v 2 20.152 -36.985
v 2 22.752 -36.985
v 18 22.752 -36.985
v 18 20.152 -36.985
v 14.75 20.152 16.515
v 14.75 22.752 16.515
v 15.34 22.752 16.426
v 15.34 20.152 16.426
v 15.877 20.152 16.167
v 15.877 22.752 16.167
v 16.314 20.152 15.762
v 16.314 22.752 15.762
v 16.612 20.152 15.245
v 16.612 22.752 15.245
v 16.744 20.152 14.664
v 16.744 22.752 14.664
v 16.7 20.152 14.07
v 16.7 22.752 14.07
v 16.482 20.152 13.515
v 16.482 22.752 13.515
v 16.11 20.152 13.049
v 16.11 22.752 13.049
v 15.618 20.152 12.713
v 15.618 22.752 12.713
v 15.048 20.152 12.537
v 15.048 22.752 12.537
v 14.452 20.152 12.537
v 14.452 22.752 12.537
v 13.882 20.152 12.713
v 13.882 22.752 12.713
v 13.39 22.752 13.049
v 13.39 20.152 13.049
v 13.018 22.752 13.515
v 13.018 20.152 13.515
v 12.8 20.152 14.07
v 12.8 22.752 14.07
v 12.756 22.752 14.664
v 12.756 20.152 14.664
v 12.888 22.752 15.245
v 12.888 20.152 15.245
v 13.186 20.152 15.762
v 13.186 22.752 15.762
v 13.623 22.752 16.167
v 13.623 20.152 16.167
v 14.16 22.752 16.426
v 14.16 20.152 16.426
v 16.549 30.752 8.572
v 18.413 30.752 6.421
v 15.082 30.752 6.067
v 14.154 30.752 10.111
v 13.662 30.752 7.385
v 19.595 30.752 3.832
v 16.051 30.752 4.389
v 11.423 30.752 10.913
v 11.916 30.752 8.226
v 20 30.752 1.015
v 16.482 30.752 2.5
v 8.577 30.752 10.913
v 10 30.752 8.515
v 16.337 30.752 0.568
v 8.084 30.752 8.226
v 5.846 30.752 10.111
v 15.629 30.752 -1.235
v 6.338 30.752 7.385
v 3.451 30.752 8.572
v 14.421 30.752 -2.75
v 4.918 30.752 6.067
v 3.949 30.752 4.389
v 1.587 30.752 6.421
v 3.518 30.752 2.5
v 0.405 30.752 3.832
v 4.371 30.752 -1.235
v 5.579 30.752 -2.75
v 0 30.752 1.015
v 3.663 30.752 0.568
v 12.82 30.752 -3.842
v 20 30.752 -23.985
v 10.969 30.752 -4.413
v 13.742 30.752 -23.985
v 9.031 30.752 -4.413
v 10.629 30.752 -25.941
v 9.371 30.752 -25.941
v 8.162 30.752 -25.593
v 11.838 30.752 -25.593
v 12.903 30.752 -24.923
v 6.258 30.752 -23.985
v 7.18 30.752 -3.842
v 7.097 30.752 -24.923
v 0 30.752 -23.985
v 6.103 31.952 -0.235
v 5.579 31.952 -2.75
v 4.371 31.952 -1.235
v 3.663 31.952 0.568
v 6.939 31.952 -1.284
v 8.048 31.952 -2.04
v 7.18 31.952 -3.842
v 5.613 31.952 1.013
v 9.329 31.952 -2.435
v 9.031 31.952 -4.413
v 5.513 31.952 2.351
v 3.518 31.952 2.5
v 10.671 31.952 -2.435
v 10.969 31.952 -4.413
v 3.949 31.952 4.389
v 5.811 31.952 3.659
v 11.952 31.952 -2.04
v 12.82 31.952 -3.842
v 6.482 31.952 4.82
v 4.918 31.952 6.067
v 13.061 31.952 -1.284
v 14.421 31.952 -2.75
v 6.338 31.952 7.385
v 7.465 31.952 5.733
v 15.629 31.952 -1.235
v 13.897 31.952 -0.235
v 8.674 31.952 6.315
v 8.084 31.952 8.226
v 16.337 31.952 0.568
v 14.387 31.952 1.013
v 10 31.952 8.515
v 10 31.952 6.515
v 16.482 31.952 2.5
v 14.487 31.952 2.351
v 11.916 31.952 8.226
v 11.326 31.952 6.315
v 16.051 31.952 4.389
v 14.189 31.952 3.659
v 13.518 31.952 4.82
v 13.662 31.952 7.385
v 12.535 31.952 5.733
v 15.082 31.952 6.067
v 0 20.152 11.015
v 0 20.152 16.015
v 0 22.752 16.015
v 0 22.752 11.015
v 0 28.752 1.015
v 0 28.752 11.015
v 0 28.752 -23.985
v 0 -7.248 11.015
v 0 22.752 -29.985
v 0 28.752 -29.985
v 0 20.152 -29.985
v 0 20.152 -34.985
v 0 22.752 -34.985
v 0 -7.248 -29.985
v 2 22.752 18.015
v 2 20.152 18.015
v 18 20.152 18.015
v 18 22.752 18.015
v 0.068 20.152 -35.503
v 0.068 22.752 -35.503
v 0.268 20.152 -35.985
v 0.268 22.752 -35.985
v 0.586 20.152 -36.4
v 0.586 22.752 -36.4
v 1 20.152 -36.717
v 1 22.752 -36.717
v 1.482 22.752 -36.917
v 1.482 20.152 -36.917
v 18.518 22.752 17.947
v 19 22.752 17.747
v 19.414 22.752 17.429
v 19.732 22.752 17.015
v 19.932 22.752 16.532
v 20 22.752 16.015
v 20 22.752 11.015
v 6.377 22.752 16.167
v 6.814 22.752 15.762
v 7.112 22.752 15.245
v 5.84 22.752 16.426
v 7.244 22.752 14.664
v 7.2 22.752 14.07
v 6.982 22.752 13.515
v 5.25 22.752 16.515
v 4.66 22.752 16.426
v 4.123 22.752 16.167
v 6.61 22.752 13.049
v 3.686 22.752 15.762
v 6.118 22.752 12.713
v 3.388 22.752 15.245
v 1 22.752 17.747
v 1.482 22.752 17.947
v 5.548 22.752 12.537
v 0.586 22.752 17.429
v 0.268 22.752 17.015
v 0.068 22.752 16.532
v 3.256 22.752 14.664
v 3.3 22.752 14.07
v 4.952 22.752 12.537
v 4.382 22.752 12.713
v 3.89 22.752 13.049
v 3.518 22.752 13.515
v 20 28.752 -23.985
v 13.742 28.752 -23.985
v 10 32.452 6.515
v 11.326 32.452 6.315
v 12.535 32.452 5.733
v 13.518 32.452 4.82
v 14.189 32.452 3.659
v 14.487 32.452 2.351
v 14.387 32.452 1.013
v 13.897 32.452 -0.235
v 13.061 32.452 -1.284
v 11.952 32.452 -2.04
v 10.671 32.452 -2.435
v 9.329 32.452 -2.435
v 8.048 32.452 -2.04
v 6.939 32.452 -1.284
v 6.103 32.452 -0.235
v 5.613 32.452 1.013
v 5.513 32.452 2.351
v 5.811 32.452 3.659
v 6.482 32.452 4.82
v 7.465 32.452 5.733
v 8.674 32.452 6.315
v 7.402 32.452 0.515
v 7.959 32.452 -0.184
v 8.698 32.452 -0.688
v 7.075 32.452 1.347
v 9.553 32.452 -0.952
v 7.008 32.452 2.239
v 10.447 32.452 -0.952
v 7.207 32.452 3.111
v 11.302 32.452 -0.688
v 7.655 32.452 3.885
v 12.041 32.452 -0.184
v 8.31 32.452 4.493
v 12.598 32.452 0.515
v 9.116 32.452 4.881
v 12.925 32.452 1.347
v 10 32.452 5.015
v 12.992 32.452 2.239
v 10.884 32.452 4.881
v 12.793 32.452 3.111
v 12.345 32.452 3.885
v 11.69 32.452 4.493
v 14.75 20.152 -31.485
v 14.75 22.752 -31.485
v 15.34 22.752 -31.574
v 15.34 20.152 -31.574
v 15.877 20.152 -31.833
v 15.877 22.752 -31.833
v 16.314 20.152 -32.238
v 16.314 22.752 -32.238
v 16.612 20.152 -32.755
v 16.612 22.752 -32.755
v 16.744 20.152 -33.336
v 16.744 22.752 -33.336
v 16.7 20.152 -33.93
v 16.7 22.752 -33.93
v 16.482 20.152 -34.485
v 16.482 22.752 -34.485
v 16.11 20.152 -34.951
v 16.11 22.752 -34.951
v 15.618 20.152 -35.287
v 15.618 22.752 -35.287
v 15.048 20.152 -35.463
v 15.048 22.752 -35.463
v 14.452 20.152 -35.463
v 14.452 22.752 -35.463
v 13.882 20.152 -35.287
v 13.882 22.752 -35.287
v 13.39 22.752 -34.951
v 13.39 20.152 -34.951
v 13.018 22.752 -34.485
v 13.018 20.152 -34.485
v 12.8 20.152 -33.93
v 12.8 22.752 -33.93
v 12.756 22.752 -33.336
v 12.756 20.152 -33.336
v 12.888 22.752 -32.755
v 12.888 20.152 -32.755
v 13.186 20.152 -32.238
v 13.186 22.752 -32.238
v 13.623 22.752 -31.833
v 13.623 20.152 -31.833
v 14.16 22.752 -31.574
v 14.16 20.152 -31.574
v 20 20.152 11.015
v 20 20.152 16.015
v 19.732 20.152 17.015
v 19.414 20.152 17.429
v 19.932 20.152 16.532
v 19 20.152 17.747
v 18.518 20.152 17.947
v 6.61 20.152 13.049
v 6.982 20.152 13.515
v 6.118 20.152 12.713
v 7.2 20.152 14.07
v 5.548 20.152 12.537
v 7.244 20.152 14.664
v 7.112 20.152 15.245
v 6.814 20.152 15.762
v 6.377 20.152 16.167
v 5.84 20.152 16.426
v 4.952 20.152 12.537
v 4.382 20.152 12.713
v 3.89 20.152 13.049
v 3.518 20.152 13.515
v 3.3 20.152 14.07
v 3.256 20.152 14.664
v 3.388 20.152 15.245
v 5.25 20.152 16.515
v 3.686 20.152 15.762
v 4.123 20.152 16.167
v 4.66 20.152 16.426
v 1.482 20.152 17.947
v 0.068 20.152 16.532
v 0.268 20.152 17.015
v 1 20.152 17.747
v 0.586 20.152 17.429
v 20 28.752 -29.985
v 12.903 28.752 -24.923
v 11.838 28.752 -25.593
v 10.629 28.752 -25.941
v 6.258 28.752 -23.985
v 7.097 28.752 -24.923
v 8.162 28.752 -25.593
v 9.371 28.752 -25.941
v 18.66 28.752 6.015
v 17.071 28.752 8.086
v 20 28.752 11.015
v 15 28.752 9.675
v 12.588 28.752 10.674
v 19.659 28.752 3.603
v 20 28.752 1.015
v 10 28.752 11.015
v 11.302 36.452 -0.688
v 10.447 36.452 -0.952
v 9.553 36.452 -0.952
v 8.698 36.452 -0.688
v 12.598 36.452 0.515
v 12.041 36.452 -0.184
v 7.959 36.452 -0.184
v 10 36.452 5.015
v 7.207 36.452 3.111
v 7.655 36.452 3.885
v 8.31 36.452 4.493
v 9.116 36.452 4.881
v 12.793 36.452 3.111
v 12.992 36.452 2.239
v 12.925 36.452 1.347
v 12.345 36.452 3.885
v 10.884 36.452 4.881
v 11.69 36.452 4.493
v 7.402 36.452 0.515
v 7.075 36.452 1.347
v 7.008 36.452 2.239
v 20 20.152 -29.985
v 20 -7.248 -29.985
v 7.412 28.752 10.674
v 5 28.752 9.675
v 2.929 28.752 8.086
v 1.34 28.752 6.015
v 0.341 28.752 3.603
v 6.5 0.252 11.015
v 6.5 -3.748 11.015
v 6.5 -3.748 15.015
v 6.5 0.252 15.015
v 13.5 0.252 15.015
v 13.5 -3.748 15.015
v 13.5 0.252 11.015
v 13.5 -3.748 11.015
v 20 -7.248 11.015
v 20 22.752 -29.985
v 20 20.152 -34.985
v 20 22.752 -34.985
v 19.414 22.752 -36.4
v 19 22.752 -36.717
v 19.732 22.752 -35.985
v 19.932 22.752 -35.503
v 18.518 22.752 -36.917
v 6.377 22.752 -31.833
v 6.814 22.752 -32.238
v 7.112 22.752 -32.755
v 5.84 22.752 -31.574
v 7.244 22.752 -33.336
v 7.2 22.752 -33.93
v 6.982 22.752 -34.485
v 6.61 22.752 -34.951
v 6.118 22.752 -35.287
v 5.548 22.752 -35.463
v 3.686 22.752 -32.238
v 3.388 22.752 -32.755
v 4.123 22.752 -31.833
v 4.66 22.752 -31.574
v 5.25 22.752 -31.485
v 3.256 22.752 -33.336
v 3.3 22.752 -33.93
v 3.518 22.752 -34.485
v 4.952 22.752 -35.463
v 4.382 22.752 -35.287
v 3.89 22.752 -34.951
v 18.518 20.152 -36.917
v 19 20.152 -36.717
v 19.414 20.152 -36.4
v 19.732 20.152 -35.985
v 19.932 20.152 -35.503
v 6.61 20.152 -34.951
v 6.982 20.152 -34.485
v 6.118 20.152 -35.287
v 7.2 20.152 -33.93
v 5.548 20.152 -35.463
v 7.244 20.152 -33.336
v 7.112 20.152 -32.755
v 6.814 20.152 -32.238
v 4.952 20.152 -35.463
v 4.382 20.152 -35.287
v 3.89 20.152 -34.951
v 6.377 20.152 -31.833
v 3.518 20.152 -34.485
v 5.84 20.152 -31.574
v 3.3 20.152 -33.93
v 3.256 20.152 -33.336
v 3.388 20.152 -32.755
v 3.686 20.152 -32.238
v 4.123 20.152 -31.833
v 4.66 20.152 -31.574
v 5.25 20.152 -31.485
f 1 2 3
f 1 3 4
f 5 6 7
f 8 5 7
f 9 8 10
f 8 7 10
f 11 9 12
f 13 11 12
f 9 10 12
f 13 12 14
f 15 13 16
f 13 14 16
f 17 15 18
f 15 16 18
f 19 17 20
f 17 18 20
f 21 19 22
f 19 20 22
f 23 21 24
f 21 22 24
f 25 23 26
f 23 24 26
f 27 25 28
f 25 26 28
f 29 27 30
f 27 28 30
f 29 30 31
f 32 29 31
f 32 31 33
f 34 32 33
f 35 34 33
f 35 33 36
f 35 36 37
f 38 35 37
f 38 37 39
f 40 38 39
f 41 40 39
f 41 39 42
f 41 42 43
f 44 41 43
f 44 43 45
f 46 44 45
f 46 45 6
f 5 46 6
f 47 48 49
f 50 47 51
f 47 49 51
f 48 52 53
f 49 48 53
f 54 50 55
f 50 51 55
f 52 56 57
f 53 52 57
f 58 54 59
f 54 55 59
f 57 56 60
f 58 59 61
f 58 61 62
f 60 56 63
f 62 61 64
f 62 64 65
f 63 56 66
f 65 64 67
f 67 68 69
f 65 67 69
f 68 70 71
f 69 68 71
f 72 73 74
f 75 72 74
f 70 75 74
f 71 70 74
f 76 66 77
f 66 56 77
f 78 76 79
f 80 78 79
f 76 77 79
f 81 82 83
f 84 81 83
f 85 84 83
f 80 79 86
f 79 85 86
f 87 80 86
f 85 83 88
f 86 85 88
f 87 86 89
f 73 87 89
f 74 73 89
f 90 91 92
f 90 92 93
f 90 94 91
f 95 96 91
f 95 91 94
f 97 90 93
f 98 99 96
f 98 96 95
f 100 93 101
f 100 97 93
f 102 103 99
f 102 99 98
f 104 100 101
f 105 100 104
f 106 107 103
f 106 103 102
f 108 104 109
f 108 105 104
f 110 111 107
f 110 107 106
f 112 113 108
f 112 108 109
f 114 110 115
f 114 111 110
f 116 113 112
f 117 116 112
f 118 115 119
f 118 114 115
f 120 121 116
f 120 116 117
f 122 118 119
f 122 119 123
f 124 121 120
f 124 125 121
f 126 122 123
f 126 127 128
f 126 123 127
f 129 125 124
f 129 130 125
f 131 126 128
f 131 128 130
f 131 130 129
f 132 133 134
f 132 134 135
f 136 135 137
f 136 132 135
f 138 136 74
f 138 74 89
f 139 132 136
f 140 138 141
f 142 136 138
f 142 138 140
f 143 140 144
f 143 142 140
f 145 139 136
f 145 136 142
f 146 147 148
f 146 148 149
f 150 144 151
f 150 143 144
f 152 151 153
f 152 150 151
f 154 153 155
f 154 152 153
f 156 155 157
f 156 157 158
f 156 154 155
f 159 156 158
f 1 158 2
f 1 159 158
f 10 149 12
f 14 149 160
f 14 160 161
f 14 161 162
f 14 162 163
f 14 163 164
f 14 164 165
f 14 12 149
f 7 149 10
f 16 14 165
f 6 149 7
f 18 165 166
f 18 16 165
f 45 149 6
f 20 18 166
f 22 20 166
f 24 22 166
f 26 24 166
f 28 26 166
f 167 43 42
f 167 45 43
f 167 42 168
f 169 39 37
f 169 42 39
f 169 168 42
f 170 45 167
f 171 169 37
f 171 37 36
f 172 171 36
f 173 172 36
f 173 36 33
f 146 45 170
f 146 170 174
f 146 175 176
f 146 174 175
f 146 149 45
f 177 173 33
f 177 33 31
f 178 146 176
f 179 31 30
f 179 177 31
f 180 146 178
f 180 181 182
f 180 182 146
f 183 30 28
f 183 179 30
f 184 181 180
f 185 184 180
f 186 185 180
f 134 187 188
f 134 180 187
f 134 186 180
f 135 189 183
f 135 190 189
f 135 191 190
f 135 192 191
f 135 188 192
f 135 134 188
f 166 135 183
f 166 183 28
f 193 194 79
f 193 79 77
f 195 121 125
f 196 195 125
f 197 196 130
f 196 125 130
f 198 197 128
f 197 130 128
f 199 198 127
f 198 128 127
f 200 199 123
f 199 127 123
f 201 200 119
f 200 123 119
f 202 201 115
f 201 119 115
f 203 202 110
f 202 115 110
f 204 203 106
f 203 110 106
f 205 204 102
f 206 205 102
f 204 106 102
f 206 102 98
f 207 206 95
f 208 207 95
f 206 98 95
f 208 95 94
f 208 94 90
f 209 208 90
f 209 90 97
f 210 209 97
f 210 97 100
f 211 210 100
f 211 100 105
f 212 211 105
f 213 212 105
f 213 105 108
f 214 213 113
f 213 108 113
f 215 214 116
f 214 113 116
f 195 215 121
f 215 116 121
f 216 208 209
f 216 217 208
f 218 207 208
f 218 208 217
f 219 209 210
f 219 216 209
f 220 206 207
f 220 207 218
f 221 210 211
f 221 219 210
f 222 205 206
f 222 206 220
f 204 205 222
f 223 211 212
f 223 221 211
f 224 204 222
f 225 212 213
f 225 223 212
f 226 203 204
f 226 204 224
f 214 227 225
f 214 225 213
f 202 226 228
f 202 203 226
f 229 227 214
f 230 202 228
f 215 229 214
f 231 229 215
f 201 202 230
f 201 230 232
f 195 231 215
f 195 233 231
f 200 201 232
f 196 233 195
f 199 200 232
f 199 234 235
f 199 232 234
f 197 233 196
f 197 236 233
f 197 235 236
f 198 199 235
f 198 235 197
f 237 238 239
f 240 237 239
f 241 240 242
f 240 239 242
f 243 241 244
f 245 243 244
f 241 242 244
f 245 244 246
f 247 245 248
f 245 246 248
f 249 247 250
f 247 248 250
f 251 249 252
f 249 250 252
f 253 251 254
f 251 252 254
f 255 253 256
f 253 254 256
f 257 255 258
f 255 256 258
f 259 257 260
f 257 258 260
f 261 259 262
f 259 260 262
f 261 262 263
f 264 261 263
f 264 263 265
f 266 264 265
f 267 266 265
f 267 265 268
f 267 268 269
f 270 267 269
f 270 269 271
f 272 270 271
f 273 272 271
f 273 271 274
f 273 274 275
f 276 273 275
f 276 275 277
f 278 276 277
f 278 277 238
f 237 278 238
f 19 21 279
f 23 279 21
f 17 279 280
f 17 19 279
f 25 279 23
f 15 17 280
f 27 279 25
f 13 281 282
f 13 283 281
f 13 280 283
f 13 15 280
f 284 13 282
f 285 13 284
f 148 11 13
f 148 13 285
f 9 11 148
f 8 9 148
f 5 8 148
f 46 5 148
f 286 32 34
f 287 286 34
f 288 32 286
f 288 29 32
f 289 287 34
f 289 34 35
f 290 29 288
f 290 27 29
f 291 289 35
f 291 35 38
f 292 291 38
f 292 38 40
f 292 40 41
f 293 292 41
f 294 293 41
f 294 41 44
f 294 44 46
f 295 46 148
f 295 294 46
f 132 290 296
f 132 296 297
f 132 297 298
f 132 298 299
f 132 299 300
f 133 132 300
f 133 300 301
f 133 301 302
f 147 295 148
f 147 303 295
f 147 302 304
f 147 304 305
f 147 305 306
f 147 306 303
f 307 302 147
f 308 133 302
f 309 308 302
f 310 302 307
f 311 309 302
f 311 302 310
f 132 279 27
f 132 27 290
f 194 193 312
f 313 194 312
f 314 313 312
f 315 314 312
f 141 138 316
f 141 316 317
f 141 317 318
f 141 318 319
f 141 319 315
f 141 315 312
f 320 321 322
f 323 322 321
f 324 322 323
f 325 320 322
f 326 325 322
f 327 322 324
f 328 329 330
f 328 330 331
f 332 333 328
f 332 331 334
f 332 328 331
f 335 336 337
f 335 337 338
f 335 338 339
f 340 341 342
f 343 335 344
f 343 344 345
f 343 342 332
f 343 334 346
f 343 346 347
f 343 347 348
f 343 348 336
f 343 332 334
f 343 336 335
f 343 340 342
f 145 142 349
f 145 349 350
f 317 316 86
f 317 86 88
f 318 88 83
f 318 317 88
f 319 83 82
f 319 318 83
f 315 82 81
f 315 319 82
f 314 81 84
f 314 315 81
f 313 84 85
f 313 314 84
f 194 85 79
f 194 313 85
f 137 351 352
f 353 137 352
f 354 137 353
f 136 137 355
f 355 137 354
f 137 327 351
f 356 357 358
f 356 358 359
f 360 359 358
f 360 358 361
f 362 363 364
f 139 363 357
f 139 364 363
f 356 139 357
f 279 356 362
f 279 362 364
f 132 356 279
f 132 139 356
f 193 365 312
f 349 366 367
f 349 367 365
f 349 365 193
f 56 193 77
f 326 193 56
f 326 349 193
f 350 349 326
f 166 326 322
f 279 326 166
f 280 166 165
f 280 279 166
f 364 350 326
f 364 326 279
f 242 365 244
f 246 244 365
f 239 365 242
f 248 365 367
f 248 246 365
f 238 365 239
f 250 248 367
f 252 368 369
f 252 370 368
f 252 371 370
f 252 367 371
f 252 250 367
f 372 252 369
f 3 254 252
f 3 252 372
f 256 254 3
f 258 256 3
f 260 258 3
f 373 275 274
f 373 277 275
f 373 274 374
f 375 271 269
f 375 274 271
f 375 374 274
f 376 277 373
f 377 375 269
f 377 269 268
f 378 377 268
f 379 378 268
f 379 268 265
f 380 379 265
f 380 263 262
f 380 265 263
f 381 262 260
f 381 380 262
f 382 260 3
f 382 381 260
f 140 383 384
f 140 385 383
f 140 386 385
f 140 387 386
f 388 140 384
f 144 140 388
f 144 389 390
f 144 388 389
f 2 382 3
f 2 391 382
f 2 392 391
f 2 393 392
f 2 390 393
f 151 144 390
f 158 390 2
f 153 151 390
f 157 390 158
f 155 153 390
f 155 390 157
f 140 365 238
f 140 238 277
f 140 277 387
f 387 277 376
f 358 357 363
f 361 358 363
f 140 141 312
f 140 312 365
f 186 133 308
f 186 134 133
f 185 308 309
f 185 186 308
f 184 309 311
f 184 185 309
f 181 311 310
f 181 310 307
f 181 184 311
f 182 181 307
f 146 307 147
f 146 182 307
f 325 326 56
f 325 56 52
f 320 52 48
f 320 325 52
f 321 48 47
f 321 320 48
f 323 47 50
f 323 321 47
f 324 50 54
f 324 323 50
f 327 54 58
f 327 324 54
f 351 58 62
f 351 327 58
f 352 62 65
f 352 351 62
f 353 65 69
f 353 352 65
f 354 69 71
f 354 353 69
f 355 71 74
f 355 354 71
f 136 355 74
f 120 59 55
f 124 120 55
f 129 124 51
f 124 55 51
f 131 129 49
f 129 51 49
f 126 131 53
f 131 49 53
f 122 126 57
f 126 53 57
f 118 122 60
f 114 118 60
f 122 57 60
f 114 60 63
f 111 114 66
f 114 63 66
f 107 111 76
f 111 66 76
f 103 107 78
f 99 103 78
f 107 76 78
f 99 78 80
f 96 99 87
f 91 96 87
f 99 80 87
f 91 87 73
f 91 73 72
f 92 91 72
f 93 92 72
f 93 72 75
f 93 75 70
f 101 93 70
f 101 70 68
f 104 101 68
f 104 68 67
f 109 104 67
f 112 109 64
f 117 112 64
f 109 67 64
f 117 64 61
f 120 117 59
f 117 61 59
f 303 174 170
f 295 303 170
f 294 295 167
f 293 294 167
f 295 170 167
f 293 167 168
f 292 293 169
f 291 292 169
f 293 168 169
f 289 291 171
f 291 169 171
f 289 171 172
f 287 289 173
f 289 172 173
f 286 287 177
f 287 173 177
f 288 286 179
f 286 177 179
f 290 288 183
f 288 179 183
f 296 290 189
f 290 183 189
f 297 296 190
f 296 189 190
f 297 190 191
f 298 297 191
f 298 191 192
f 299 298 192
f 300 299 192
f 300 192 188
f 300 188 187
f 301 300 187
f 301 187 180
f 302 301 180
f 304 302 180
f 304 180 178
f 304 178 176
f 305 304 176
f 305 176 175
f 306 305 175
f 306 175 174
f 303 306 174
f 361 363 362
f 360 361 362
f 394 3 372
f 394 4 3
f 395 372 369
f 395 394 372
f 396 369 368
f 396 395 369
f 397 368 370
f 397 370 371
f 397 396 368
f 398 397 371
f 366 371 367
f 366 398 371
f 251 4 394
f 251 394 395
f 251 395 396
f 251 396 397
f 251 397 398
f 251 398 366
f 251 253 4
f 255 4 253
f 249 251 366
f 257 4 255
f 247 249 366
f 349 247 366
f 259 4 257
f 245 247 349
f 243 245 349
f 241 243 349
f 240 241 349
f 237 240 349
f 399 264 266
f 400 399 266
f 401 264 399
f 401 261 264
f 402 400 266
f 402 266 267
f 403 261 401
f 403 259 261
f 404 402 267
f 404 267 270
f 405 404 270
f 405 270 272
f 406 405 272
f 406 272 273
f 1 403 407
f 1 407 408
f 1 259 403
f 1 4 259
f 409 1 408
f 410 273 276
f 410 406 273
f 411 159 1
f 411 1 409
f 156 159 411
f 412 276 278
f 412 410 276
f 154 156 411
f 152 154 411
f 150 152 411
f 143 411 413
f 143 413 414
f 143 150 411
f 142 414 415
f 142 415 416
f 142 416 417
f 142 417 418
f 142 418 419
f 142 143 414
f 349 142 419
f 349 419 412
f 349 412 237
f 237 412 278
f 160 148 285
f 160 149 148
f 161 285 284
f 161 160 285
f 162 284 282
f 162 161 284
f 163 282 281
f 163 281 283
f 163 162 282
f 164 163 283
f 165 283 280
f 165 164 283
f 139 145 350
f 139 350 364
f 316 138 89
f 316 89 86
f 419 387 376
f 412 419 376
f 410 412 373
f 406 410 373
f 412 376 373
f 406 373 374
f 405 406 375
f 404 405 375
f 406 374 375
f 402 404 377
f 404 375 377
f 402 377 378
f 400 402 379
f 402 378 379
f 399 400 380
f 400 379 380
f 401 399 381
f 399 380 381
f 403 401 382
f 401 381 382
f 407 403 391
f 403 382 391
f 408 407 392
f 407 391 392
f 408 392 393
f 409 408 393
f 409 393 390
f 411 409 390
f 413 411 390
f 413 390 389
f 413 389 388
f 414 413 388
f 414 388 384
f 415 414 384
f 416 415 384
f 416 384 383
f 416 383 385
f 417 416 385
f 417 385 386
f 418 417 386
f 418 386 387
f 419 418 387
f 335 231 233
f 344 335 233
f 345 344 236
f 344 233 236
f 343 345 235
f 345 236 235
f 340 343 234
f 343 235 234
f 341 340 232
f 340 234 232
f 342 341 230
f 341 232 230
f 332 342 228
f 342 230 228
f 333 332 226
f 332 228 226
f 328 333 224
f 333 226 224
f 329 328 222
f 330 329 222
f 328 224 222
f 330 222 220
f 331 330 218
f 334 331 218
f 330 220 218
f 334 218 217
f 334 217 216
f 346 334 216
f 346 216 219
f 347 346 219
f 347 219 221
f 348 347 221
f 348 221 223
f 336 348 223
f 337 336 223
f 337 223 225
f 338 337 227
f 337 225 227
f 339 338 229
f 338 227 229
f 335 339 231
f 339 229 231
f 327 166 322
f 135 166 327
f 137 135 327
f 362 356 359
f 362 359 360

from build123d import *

# Parameters (mm, degrees)
AUFSATZ_LINEAR_AUSTRAGEN3_DEPTH = 20
AUFSATZ_LINEAR_AUSTRAGEN4_DEPTH = 2
SKIZZE3_R                       = 6.5
AUFSATZ_LINEAR_AUSTRAGEN5_DEPTH = 1.2
SCHNITT_LINEAR_AUSTRAGEN1_REACH = 53.652
SKIZZE4_R                       = 2
SKIZZE6_W                       = 7
SKIZZE6_H                       = 4
AUFSATZ_LINEAR_AUSTRAGEN6_DEPTH = 4
SKIZZE7_R                       = 4.5
AUFSATZ_LINEAR_AUSTRAGEN7_DEPTH = 0.5
SKIZZE8_R                       = 3
AUFSATZ_LINEAR_AUSTRAGEN8_DEPTH = 4
VERRUNDUNG3_R                   = 2


with BuildPart() as part:
    # Skizze1 → Aufsatz-Linear austragen3 (new body)
    with BuildSketch(Plane(origin=(0, 0, 0), x_dir=(0, 0, -1), z_dir=(1, 0, 0))):
        Polygon((-11.014679398, 22.752092755), (-11.014679398, 28.752092755), (29.985320602, 28.752092755), (29.985320602, 22.752092755), (36.985320602, 22.752092755), (36.985320602, 20.152092755), (29.985320602, 20.152092755), (29.985320602, -7.247907245), (-11.014679398, -7.247907245), (-11.014679398, 20.152092755), (-18.014679398, 20.152092755), (-18.014679398, 22.752092755), align=None)
    extrude(amount=AUFSATZ_LINEAR_AUSTRAGEN3_DEPTH)

    # Skizze2 → Aufsatz-Linear austragen4 (add)
    with BuildSketch(Plane(origin=(0, 28.752092755, 0), x_dir=(1, 0, 0), z_dir=(0, 1, 0))):
        with BuildLine():
            Line((0, -1.014679398), (0, 23.985320602))
            Line((0, 23.985320602), (6.258342613, 23.985320602))
            ThreePointArc((6.258342613, 23.985320602), (10, 25.985320602), (13.741657387, 23.985320602))
            Line((13.741657387, 23.985320602), (20, 23.985320602))
            Line((20, 23.985320602), (20, -1.014679398))
            ThreePointArc((20, -1.014679398), (10, -11.014679398), (0, -1.014679398))
        make_face()
    extrude(amount=AUFSATZ_LINEAR_AUSTRAGEN4_DEPTH)

    # Skizze3 → Aufsatz-Linear austragen5 (add)
    with BuildSketch(Plane(origin=(0, 30.752092755, 0), x_dir=(1, 0, 0), z_dir=(0, 1, 0))):
        with Locations(Location((10, -2.014679398, 0), (0, 0, 270))):
            Circle(SKIZZE3_R)
    extrude(amount=AUFSATZ_LINEAR_AUSTRAGEN5_DEPTH)

    # Skizze4 → Schnitt-Linear austragen1 (cut, up to next)
    with BuildSketch(Plane(origin=(0, 22.752092755, 0), x_dir=(1, 0, 0), z_dir=(0, 1, 0)), mode=Mode.PRIVATE) as schnitt_linear_austragen1_sk1:
        with Locations(Location((5.25, -14.514679398, 0), (0, 0, 270))):
            Circle(SKIZZE4_R)
    schnitt_linear_austragen1_tool1 = extrude(schnitt_linear_austragen1_sk1.sketch, amount=-SCHNITT_LINEAR_AUSTRAGEN1_REACH, mode=Mode.PRIVATE) & part.part
    # Skizze4 → Schnitt-Linear austragen1 (cut, up to next)
    with BuildSketch(Plane(origin=(0, 22.752092755, 0), x_dir=(1, 0, 0), z_dir=(0, 1, 0)), mode=Mode.PRIVATE) as schnitt_linear_austragen1_sk2:
        with Locations(Location((14.75, -14.514679398, 0), (0, 0, 270))):
            Circle(SKIZZE4_R)
    schnitt_linear_austragen1_tool2 = extrude(schnitt_linear_austragen1_sk2.sketch, amount=-SCHNITT_LINEAR_AUSTRAGEN1_REACH, mode=Mode.PRIVATE) & part.part
    # Skizze4 → Schnitt-Linear austragen1 (cut, up to next)
    with BuildSketch(Plane(origin=(0, 22.752092755, 0), x_dir=(1, 0, 0), z_dir=(0, 1, 0)), mode=Mode.PRIVATE) as schnitt_linear_austragen1_sk3:
        with Locations(Location((14.75, 33.485320602, 0), (0, 0, 270))):
            Circle(SKIZZE4_R)
    schnitt_linear_austragen1_tool3 = extrude(schnitt_linear_austragen1_sk3.sketch, amount=-SCHNITT_LINEAR_AUSTRAGEN1_REACH, mode=Mode.PRIVATE) & part.part
    # Skizze4 → Schnitt-Linear austragen1 (cut, up to next)
    with BuildSketch(Plane(origin=(0, 22.752092755, 0), x_dir=(1, 0, 0), z_dir=(0, 1, 0)), mode=Mode.PRIVATE) as schnitt_linear_austragen1_sk4:
        with Locations(Location((5.25, 33.485320602, 0), (0, 0, 270))):
            Circle(SKIZZE4_R)
    schnitt_linear_austragen1_tool4 = extrude(schnitt_linear_austragen1_sk4.sketch, amount=-SCHNITT_LINEAR_AUSTRAGEN1_REACH, mode=Mode.PRIVATE) & part.part
    add(schnitt_linear_austragen1_tool1.solids().sort_by_distance((5.25, 22.752093, 14.514679))[0], mode=Mode.SUBTRACT)
    add(schnitt_linear_austragen1_tool2.solids().sort_by_distance((14.75, 22.752093, 14.514679))[0], mode=Mode.SUBTRACT)
    add(schnitt_linear_austragen1_tool3.solids().sort_by_distance((14.75, 22.752093, -33.485321))[0], mode=Mode.SUBTRACT)
    add(schnitt_linear_austragen1_tool4.solids().sort_by_distance((5.25, 22.752093, -33.485321))[0], mode=Mode.SUBTRACT)

    # Skizze6 → Aufsatz-Linear austragen6 (add)
    with BuildSketch(Plane.XY.offset(11.014679398)):
        with Locations((10, -1.747907245)):
            Rectangle(SKIZZE6_W, SKIZZE6_H)
    extrude(amount=AUFSATZ_LINEAR_AUSTRAGEN6_DEPTH)

    # Skizze7 → Aufsatz-Linear austragen7 (add)
    with BuildSketch(Plane(origin=(0, 31.952092755, 0), x_dir=(1, 0, 0), z_dir=(0, 1, 0))):
        with Locations(Location((10, -2.014679398, 0), (0, 0, 270))):
            Circle(SKIZZE7_R)
    extrude(amount=AUFSATZ_LINEAR_AUSTRAGEN7_DEPTH)

    # Skizze8 → Aufsatz-Linear austragen8 (add)
    with BuildSketch(Plane(origin=(0, 32.452092755, 0), x_dir=(1, 0, 0), z_dir=(0, 1, 0))):
        with Locations(Location((10, -2.014679398, 0), (0, 0, 270))):
            Circle(SKIZZE8_R)
    extrude(amount=AUFSATZ_LINEAR_AUSTRAGEN8_DEPTH)

    # Verrundung3
    verrundung3_edges = [part.edges().sort_by_distance(p)[0] for p in [
        (0, 21.452092755, 18.014679398),
        (0, 21.452092755, -36.985320602),
        (20, 21.452092755, -36.985320602),
        (20, 21.452092755, 18.014679398),
    ]]
    fillet(verrundung3_edges, radius=VERRUNDUNG3_R)


solid = part.part
